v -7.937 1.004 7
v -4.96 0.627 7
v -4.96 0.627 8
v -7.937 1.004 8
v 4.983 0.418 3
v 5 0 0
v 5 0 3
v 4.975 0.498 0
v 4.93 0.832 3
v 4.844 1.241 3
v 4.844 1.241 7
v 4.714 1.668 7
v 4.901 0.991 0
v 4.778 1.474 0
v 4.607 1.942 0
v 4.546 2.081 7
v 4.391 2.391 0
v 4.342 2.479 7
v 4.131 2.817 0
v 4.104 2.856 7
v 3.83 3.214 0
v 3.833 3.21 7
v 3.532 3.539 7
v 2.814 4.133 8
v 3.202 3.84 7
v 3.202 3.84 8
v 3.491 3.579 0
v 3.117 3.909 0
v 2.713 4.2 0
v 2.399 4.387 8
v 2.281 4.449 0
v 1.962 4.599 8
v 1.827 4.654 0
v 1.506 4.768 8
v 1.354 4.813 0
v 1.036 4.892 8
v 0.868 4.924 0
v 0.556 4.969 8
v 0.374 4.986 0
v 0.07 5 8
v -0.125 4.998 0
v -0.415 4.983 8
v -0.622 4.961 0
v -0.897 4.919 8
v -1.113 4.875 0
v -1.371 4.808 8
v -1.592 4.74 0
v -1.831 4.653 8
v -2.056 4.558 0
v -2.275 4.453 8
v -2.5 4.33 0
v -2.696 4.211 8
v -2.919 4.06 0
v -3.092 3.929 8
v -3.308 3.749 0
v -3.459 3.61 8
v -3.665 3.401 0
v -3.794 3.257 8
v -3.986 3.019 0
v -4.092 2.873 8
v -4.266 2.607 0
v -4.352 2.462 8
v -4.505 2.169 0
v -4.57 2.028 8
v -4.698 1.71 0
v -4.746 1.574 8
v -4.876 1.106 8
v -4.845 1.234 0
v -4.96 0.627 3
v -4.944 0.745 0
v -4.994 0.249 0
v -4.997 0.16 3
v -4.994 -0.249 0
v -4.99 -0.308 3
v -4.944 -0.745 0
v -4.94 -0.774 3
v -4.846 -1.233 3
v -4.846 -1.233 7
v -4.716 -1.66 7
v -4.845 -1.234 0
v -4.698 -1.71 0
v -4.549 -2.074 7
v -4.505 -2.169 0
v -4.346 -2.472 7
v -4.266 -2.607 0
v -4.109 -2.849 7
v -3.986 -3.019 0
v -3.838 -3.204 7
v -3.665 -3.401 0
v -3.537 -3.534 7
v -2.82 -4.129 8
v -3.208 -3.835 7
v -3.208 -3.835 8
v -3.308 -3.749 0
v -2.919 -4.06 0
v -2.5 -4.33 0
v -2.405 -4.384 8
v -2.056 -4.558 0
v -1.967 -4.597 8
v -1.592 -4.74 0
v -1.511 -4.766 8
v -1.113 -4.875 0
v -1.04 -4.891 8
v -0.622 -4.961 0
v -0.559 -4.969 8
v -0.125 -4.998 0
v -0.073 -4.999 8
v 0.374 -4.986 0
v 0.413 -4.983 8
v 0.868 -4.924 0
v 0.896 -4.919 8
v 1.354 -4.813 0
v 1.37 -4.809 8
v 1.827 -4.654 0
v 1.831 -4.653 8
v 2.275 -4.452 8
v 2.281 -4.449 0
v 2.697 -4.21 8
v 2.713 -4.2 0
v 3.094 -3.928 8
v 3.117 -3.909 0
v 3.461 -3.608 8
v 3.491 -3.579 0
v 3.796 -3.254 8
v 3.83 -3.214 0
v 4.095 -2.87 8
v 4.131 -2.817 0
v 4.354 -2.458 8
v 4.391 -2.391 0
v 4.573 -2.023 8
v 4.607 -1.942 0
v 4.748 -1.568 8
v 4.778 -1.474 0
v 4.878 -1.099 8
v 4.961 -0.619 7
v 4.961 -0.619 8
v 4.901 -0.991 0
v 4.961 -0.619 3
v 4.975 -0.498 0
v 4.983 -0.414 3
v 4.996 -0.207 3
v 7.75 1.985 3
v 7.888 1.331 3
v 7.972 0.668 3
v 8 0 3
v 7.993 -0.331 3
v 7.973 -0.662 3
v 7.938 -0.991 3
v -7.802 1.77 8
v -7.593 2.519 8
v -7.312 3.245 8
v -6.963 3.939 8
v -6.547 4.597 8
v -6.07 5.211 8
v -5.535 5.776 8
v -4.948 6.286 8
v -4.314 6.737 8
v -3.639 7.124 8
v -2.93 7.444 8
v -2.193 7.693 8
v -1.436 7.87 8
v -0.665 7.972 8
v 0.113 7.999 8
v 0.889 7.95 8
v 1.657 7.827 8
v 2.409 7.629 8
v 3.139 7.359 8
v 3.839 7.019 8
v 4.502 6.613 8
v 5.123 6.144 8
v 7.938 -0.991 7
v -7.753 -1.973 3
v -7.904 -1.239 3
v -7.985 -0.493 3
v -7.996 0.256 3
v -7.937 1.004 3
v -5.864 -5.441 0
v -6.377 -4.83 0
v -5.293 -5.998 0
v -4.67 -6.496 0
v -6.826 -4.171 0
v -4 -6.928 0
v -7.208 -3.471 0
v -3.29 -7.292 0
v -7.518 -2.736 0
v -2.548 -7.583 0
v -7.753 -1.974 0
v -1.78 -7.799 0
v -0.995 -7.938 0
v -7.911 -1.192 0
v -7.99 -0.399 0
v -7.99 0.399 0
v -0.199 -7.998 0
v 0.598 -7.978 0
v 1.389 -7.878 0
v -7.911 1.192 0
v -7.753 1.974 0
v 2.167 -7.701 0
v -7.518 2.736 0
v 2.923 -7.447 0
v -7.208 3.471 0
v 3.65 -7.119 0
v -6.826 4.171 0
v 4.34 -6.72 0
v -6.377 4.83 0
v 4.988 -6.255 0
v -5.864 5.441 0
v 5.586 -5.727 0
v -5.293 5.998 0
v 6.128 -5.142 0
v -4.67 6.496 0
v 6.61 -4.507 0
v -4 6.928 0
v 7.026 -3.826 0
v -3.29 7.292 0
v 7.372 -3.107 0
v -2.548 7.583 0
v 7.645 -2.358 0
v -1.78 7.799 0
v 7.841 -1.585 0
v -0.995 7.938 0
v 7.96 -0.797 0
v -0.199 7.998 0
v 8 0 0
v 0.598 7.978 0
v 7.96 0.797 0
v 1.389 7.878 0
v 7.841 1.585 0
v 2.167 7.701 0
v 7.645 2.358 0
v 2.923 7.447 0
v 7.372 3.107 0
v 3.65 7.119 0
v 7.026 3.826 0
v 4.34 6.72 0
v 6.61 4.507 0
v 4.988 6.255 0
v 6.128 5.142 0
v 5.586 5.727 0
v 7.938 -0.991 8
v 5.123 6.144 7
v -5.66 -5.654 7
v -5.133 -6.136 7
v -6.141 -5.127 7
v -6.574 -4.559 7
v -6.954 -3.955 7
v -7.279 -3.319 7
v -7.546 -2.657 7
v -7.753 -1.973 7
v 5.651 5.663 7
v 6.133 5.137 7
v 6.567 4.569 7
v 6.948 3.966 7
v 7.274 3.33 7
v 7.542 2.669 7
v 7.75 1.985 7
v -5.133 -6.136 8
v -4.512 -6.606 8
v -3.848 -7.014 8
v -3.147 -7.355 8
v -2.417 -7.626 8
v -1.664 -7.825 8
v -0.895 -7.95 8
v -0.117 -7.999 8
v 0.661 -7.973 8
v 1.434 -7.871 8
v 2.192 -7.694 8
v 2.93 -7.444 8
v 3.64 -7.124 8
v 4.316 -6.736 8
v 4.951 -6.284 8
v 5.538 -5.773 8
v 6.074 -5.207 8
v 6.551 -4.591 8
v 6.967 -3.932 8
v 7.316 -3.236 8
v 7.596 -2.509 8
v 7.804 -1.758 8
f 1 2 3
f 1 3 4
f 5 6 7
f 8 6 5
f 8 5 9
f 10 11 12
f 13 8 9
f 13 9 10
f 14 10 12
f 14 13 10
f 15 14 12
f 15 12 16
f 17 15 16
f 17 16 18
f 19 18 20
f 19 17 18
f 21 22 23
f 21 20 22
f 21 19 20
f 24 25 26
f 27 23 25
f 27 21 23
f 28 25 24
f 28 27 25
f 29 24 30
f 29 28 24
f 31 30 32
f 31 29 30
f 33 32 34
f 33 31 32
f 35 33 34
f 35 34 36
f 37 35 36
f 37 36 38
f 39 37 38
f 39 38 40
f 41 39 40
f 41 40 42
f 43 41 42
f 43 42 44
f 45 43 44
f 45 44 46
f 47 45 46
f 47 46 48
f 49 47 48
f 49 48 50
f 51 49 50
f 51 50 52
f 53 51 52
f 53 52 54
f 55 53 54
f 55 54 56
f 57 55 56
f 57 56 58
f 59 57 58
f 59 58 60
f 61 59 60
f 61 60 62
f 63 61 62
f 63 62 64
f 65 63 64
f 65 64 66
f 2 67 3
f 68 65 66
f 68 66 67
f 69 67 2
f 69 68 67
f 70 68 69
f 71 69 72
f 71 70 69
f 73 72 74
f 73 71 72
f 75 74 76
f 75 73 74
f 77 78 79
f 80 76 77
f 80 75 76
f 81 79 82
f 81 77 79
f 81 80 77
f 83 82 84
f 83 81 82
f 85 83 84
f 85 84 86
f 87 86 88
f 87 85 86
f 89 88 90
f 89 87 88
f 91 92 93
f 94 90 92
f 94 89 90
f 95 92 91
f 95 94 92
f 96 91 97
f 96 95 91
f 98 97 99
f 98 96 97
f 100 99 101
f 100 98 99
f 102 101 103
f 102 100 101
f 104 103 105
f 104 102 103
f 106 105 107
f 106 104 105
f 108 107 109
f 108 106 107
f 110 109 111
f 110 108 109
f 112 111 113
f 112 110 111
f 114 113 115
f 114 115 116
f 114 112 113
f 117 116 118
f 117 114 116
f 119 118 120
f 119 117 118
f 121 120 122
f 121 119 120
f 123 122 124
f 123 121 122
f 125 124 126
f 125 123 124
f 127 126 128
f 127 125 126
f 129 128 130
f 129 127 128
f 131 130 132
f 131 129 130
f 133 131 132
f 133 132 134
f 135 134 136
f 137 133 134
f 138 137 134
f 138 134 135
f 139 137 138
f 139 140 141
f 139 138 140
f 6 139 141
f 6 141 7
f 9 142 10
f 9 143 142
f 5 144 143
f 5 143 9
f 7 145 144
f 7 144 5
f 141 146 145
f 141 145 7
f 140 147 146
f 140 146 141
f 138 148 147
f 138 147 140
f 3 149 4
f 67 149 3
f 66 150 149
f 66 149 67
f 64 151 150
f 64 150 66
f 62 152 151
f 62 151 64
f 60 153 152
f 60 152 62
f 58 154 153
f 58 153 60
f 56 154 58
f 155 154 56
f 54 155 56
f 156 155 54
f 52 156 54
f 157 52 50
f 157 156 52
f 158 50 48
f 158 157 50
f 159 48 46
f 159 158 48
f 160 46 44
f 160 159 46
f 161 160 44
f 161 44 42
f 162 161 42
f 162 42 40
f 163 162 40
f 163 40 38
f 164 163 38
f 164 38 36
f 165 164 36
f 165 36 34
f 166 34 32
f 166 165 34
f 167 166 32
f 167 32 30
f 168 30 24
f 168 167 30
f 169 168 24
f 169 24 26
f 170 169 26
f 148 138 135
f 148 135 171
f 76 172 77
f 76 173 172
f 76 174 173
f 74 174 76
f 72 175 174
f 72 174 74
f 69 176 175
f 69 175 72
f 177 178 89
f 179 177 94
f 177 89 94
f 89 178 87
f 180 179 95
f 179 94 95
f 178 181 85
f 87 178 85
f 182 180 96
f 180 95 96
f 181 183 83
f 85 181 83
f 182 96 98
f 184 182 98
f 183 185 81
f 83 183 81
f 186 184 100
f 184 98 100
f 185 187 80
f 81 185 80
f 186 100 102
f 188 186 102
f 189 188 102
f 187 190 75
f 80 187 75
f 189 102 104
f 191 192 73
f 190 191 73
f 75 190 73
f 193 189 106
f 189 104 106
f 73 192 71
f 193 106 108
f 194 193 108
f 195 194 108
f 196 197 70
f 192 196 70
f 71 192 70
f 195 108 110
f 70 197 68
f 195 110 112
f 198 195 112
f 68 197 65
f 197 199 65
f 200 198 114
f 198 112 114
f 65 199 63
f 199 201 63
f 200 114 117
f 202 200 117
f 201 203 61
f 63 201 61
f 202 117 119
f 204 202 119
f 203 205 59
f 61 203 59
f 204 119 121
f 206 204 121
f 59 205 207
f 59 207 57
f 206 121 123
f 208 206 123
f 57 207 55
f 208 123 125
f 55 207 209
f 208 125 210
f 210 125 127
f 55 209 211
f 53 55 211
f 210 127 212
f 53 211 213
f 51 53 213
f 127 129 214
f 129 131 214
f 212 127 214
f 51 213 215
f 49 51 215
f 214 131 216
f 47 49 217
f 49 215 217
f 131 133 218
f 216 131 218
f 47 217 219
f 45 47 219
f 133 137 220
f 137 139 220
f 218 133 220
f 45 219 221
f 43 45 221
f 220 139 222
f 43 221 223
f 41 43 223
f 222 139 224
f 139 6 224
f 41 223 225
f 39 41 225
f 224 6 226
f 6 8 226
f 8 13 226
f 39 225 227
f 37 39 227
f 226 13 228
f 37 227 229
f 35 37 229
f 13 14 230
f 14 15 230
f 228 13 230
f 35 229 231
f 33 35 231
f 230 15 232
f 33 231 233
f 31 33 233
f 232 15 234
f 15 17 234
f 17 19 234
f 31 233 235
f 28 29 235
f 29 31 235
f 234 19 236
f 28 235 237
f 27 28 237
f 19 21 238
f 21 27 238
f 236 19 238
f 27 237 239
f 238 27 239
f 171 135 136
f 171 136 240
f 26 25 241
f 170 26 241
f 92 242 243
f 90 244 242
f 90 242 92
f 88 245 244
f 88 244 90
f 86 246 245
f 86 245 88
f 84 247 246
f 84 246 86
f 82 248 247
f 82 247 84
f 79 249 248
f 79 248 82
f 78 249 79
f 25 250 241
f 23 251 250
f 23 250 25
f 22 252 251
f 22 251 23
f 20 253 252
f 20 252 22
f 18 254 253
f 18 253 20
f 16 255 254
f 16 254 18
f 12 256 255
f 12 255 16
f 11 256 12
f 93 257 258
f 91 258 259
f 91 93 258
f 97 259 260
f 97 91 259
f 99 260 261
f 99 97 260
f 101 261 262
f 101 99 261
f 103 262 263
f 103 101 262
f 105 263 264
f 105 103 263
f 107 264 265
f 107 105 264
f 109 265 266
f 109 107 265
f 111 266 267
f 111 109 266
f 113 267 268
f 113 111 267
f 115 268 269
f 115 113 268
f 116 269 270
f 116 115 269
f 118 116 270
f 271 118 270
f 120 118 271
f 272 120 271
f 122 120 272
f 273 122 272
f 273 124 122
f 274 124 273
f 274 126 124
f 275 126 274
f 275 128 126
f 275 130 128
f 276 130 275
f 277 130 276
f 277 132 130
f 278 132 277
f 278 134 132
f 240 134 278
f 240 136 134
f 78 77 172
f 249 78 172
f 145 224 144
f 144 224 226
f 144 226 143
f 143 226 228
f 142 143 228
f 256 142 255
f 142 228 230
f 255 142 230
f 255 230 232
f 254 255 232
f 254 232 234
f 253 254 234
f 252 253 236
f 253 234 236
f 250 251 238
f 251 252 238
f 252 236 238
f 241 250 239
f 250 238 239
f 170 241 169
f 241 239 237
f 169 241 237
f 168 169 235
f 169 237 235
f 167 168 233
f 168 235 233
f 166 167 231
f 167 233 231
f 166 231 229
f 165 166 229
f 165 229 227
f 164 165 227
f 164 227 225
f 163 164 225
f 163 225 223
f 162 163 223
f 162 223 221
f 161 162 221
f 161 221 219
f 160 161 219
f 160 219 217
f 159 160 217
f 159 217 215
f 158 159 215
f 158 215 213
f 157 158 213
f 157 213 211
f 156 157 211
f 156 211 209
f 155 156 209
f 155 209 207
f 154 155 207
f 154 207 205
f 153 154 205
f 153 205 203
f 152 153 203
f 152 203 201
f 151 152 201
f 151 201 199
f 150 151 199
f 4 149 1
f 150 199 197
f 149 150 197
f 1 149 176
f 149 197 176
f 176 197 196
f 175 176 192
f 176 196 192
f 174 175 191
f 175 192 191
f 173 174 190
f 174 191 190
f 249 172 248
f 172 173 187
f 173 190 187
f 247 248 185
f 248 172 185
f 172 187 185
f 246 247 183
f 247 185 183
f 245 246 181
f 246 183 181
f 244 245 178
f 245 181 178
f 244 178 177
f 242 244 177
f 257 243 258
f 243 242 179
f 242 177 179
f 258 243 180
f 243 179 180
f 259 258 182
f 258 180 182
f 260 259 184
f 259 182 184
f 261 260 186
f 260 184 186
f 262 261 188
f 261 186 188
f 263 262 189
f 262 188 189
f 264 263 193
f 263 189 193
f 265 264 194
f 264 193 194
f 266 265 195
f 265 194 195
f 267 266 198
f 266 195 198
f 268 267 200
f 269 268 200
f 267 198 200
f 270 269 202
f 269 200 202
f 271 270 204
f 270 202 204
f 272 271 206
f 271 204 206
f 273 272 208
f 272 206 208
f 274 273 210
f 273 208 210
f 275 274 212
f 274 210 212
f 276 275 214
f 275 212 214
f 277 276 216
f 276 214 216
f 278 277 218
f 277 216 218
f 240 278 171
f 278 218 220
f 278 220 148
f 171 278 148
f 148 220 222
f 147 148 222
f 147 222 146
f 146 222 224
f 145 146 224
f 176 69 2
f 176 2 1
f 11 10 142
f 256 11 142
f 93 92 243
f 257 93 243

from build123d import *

# Parameters (mm, degrees)
SKETCH1_R                = 8
SKETCH1_R_2              = 5
BOSS_EXTRUDE1_DEPTH      = 8
WRAP2_SECTION_W          = 4
WRAP2_SECTION_H          = 1
WRAP2_ANGLE              = 57.295779513
WRAP2_SECTOR_2_SECTION_W = 4
WRAP2_SECTOR_2_SECTION_H = 1
WRAP2_SECTOR_2_ANGLE     = 57.295779513
WRAP2_SECTOR_3_SECTION_W = 4
WRAP2_SECTOR_3_SECTION_H = 4
WRAP2_SECTOR_3_ANGLE     = 21.485917317
WRAP2_SECTOR_4_SECTION_W = 4
WRAP2_SECTOR_4_SECTION_H = 4
WRAP2_SECTOR_4_ANGLE     = 21.485917317


with BuildPart() as part:
    # Sketch1 → Boss-Extrude1 (new body)
    with BuildSketch(Plane.XY):
        Circle(SKETCH1_R)
        Circle(SKETCH1_R_2, mode=Mode.SUBTRACT)
    extrude(amount=BOSS_EXTRUDE1_DEPTH)

    # Wrap2 section (on wrap section) → Wrap2 (revolve, cut)
    with BuildSketch(Plane(origin=(0, 0, 0), x_dir=(-0.6416078703161084, -0.7670328159527646, 0), z_dir=(0.7670328159527646, -0.6416078703161084, 0))):
        with Locations((6, -7.5)):
            Rectangle(WRAP2_SECTION_W, WRAP2_SECTION_H)
    revolve(axis=Axis((0, 0, 0), (0, 0, -1)), revolution_arc=WRAP2_ANGLE, mode=Mode.SUBTRACT)

    # Wrap2 sector 2 section (on wrap section) → Wrap2 sector 2 (revolve, cut)
    with BuildSketch(Plane(origin=(0, 0, 0), x_dir=(0.6403854395311468, 0.7680537017920687, 0), z_dir=(-0.7680537017920687, 0.6403854395311468, 0))):
        with Locations((6, -7.5)):
            Rectangle(WRAP2_SECTOR_2_SECTION_W, WRAP2_SECTOR_2_SECTION_H)
    revolve(axis=Axis((0, 0, 0), (0, 0, -1)), revolution_arc=WRAP2_SECTOR_2_ANGLE, mode=Mode.SUBTRACT)

    # Wrap2 sector 3 section (on wrap section) → Wrap2 sector 3 (revolve, cut)
    with BuildSketch(Plane(origin=(0, 0, 0), x_dir=(-0.9691091288804563, -0.24663230996883403, 0), z_dir=(0.24663230996883403, -0.9691091288804563, 0))):
        with Locations((6, -5)):
            Rectangle(WRAP2_SECTOR_3_SECTION_W, WRAP2_SECTOR_3_SECTION_H)
    revolve(axis=Axis((0, 0, 0), (0, 0, -1)), revolution_arc=WRAP2_SECTOR_3_ANGLE, mode=Mode.SUBTRACT)

    # Wrap2 sector 4 section (on wrap section) → Wrap2 sector 4 (revolve, cut)
    with BuildSketch(Plane(origin=(0, 0, 0), x_dir=(0.9687151001182653, 0.24817545165237268, 0), z_dir=(-0.24817545165237268, 0.9687151001182653, 0))):
        with Locations((6, -5)):
            Rectangle(WRAP2_SECTOR_4_SECTION_W, WRAP2_SECTOR_4_SECTION_H)
    revolve(axis=Axis((0, 0, 0), (0, 0, -1)), revolution_arc=WRAP2_SECTOR_4_ANGLE, mode=Mode.SUBTRACT)


solid = part.part
